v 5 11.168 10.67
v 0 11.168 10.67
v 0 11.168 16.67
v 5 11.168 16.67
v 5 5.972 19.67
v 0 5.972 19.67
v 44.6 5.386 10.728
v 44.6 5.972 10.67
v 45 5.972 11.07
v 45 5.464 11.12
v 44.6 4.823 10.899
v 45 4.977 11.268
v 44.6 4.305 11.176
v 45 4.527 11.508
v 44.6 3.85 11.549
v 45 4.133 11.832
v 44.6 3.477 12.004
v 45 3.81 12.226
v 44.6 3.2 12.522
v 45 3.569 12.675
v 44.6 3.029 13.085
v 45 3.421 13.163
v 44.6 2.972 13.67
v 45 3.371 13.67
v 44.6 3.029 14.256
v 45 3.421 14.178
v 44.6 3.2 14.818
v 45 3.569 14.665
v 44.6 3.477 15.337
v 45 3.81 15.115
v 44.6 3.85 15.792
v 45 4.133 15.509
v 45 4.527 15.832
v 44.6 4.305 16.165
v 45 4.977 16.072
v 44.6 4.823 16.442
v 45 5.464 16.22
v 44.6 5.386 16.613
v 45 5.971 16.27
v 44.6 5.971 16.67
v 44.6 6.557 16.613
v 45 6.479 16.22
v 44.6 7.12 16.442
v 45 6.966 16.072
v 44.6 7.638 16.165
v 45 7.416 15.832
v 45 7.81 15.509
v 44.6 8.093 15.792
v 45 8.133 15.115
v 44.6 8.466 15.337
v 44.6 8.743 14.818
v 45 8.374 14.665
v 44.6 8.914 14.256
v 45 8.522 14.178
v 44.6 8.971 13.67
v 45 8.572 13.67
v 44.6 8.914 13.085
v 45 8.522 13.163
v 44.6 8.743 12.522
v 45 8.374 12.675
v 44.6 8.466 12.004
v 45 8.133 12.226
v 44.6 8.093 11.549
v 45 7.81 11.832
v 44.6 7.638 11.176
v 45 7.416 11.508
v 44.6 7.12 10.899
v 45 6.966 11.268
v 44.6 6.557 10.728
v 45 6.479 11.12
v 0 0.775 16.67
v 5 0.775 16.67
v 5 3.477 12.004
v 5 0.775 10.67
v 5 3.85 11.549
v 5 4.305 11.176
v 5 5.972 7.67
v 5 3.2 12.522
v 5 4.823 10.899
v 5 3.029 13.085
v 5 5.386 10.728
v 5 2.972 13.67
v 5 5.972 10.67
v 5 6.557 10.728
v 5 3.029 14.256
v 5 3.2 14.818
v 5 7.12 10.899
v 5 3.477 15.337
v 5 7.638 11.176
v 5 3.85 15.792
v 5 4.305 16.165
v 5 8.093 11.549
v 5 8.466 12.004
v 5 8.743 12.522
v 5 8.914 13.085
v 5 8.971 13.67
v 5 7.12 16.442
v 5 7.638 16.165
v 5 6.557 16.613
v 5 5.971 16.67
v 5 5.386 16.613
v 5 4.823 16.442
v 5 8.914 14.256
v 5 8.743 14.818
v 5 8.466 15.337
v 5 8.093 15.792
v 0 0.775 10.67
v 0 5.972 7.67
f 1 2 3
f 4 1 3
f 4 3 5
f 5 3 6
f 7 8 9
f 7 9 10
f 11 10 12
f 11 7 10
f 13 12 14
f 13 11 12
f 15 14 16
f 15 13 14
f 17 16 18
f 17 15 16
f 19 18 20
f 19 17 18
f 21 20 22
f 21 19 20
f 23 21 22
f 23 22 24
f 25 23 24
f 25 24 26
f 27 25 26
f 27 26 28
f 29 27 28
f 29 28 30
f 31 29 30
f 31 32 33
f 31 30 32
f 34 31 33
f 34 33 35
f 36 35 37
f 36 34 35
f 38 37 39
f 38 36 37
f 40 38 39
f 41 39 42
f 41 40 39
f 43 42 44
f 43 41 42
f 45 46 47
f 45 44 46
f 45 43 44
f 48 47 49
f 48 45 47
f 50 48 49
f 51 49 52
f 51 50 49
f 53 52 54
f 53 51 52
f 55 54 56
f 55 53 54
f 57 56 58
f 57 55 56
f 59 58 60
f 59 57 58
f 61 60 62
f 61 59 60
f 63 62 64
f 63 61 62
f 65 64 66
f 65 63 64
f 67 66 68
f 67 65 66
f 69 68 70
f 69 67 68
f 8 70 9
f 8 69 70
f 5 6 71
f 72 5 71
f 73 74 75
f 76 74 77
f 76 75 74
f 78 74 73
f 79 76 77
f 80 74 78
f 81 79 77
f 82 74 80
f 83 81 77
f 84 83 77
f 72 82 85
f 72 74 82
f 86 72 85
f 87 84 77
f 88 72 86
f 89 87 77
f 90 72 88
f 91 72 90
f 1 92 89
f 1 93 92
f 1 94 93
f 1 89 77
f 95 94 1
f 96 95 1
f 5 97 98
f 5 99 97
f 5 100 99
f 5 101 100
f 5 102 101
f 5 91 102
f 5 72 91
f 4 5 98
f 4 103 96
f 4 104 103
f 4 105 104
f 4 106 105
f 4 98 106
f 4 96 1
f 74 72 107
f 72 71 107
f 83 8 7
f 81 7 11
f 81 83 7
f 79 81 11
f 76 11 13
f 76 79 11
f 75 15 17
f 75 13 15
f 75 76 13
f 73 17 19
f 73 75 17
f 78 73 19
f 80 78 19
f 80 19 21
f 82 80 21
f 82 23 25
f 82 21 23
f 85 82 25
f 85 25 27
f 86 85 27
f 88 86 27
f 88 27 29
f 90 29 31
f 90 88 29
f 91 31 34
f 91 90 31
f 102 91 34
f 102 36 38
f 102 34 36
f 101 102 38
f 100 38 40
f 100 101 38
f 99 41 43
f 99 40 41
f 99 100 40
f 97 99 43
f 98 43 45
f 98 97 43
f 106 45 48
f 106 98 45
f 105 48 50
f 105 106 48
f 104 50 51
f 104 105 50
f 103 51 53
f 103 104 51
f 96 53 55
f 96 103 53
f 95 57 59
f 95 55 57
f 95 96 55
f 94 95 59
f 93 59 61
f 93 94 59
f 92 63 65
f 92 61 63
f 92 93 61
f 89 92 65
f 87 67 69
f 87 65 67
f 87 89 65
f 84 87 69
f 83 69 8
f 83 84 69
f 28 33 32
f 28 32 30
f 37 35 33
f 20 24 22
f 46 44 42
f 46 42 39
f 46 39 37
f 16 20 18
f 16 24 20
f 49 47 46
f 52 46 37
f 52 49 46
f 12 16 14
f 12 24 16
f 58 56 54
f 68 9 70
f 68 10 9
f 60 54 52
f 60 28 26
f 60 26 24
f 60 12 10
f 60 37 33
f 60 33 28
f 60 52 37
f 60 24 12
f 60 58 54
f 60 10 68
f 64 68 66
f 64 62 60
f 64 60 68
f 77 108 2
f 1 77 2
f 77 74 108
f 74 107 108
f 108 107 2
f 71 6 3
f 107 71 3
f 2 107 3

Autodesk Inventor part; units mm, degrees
ref_plane "YZ Plane" through (0, 0, 0) normal (1, 0, 0) x (0, 1, 0)
ref_plane "XZ Plane" through (0, 0, 0) normal (0, 1, 0) x (-1, 0, 0)
ref_plane "XY Plane" through (0, 0, 0) normal (0, 0, 1) x (1, 0, 0)
sketch "Sketch1" plane through (0, 0, 0) normal (1, 0, 0) x (0, 1, 0)
  line L0 (11.1677, 16.6703) -> (5.9715, 19.6703)
  line L1 (5.9715, 19.6703) -> (0.7754, 16.6703)
  line L2 (0.7754, 16.6703) -> (0.7754, 10.6703)
  line L3 (0.7754, 10.6703) -> (5.9715, 7.6703)
  line L4 (5.9715, 7.6703) -> (11.1677, 10.6703)
  line L5 (11.1677, 10.6703) -> (11.1677, 16.6703)
  point P0 (0, 0)
  dimension "d0" = 120
  dimension "d1" = 120
  dimension "d2" = 6
extrude "Extrusion1" add sketch "Sketch1" along normal blind 5
sketch "Sketch2" plane through (5, 0, 0) normal (1, 0, 0) x (0, 0, -1)
  circle A0 centre (-13.6703, 5.9715) radius 3
  point P0 (0, 0)
  point P1 (-16.6703, 11.1677)
  point P2 (-10.6703, 0.7754)
  point P3 (-16.6703, 0.7754)
  dimension "d5" = 6
  dimension "d6" = 6
  dimension "d7" = 6
extrude "Extrusion2" add sketch "Sketch2" along normal blind 40
thread "Thread1" size "1/4-20 UNC" class "2A" standard "ANSI Unified Screw Threads" full length
chamfer "Chamfer1" distance 0.4 angle 45 1 edges at (45, 5.9715, 16.6703)
properties part number "Screw"
